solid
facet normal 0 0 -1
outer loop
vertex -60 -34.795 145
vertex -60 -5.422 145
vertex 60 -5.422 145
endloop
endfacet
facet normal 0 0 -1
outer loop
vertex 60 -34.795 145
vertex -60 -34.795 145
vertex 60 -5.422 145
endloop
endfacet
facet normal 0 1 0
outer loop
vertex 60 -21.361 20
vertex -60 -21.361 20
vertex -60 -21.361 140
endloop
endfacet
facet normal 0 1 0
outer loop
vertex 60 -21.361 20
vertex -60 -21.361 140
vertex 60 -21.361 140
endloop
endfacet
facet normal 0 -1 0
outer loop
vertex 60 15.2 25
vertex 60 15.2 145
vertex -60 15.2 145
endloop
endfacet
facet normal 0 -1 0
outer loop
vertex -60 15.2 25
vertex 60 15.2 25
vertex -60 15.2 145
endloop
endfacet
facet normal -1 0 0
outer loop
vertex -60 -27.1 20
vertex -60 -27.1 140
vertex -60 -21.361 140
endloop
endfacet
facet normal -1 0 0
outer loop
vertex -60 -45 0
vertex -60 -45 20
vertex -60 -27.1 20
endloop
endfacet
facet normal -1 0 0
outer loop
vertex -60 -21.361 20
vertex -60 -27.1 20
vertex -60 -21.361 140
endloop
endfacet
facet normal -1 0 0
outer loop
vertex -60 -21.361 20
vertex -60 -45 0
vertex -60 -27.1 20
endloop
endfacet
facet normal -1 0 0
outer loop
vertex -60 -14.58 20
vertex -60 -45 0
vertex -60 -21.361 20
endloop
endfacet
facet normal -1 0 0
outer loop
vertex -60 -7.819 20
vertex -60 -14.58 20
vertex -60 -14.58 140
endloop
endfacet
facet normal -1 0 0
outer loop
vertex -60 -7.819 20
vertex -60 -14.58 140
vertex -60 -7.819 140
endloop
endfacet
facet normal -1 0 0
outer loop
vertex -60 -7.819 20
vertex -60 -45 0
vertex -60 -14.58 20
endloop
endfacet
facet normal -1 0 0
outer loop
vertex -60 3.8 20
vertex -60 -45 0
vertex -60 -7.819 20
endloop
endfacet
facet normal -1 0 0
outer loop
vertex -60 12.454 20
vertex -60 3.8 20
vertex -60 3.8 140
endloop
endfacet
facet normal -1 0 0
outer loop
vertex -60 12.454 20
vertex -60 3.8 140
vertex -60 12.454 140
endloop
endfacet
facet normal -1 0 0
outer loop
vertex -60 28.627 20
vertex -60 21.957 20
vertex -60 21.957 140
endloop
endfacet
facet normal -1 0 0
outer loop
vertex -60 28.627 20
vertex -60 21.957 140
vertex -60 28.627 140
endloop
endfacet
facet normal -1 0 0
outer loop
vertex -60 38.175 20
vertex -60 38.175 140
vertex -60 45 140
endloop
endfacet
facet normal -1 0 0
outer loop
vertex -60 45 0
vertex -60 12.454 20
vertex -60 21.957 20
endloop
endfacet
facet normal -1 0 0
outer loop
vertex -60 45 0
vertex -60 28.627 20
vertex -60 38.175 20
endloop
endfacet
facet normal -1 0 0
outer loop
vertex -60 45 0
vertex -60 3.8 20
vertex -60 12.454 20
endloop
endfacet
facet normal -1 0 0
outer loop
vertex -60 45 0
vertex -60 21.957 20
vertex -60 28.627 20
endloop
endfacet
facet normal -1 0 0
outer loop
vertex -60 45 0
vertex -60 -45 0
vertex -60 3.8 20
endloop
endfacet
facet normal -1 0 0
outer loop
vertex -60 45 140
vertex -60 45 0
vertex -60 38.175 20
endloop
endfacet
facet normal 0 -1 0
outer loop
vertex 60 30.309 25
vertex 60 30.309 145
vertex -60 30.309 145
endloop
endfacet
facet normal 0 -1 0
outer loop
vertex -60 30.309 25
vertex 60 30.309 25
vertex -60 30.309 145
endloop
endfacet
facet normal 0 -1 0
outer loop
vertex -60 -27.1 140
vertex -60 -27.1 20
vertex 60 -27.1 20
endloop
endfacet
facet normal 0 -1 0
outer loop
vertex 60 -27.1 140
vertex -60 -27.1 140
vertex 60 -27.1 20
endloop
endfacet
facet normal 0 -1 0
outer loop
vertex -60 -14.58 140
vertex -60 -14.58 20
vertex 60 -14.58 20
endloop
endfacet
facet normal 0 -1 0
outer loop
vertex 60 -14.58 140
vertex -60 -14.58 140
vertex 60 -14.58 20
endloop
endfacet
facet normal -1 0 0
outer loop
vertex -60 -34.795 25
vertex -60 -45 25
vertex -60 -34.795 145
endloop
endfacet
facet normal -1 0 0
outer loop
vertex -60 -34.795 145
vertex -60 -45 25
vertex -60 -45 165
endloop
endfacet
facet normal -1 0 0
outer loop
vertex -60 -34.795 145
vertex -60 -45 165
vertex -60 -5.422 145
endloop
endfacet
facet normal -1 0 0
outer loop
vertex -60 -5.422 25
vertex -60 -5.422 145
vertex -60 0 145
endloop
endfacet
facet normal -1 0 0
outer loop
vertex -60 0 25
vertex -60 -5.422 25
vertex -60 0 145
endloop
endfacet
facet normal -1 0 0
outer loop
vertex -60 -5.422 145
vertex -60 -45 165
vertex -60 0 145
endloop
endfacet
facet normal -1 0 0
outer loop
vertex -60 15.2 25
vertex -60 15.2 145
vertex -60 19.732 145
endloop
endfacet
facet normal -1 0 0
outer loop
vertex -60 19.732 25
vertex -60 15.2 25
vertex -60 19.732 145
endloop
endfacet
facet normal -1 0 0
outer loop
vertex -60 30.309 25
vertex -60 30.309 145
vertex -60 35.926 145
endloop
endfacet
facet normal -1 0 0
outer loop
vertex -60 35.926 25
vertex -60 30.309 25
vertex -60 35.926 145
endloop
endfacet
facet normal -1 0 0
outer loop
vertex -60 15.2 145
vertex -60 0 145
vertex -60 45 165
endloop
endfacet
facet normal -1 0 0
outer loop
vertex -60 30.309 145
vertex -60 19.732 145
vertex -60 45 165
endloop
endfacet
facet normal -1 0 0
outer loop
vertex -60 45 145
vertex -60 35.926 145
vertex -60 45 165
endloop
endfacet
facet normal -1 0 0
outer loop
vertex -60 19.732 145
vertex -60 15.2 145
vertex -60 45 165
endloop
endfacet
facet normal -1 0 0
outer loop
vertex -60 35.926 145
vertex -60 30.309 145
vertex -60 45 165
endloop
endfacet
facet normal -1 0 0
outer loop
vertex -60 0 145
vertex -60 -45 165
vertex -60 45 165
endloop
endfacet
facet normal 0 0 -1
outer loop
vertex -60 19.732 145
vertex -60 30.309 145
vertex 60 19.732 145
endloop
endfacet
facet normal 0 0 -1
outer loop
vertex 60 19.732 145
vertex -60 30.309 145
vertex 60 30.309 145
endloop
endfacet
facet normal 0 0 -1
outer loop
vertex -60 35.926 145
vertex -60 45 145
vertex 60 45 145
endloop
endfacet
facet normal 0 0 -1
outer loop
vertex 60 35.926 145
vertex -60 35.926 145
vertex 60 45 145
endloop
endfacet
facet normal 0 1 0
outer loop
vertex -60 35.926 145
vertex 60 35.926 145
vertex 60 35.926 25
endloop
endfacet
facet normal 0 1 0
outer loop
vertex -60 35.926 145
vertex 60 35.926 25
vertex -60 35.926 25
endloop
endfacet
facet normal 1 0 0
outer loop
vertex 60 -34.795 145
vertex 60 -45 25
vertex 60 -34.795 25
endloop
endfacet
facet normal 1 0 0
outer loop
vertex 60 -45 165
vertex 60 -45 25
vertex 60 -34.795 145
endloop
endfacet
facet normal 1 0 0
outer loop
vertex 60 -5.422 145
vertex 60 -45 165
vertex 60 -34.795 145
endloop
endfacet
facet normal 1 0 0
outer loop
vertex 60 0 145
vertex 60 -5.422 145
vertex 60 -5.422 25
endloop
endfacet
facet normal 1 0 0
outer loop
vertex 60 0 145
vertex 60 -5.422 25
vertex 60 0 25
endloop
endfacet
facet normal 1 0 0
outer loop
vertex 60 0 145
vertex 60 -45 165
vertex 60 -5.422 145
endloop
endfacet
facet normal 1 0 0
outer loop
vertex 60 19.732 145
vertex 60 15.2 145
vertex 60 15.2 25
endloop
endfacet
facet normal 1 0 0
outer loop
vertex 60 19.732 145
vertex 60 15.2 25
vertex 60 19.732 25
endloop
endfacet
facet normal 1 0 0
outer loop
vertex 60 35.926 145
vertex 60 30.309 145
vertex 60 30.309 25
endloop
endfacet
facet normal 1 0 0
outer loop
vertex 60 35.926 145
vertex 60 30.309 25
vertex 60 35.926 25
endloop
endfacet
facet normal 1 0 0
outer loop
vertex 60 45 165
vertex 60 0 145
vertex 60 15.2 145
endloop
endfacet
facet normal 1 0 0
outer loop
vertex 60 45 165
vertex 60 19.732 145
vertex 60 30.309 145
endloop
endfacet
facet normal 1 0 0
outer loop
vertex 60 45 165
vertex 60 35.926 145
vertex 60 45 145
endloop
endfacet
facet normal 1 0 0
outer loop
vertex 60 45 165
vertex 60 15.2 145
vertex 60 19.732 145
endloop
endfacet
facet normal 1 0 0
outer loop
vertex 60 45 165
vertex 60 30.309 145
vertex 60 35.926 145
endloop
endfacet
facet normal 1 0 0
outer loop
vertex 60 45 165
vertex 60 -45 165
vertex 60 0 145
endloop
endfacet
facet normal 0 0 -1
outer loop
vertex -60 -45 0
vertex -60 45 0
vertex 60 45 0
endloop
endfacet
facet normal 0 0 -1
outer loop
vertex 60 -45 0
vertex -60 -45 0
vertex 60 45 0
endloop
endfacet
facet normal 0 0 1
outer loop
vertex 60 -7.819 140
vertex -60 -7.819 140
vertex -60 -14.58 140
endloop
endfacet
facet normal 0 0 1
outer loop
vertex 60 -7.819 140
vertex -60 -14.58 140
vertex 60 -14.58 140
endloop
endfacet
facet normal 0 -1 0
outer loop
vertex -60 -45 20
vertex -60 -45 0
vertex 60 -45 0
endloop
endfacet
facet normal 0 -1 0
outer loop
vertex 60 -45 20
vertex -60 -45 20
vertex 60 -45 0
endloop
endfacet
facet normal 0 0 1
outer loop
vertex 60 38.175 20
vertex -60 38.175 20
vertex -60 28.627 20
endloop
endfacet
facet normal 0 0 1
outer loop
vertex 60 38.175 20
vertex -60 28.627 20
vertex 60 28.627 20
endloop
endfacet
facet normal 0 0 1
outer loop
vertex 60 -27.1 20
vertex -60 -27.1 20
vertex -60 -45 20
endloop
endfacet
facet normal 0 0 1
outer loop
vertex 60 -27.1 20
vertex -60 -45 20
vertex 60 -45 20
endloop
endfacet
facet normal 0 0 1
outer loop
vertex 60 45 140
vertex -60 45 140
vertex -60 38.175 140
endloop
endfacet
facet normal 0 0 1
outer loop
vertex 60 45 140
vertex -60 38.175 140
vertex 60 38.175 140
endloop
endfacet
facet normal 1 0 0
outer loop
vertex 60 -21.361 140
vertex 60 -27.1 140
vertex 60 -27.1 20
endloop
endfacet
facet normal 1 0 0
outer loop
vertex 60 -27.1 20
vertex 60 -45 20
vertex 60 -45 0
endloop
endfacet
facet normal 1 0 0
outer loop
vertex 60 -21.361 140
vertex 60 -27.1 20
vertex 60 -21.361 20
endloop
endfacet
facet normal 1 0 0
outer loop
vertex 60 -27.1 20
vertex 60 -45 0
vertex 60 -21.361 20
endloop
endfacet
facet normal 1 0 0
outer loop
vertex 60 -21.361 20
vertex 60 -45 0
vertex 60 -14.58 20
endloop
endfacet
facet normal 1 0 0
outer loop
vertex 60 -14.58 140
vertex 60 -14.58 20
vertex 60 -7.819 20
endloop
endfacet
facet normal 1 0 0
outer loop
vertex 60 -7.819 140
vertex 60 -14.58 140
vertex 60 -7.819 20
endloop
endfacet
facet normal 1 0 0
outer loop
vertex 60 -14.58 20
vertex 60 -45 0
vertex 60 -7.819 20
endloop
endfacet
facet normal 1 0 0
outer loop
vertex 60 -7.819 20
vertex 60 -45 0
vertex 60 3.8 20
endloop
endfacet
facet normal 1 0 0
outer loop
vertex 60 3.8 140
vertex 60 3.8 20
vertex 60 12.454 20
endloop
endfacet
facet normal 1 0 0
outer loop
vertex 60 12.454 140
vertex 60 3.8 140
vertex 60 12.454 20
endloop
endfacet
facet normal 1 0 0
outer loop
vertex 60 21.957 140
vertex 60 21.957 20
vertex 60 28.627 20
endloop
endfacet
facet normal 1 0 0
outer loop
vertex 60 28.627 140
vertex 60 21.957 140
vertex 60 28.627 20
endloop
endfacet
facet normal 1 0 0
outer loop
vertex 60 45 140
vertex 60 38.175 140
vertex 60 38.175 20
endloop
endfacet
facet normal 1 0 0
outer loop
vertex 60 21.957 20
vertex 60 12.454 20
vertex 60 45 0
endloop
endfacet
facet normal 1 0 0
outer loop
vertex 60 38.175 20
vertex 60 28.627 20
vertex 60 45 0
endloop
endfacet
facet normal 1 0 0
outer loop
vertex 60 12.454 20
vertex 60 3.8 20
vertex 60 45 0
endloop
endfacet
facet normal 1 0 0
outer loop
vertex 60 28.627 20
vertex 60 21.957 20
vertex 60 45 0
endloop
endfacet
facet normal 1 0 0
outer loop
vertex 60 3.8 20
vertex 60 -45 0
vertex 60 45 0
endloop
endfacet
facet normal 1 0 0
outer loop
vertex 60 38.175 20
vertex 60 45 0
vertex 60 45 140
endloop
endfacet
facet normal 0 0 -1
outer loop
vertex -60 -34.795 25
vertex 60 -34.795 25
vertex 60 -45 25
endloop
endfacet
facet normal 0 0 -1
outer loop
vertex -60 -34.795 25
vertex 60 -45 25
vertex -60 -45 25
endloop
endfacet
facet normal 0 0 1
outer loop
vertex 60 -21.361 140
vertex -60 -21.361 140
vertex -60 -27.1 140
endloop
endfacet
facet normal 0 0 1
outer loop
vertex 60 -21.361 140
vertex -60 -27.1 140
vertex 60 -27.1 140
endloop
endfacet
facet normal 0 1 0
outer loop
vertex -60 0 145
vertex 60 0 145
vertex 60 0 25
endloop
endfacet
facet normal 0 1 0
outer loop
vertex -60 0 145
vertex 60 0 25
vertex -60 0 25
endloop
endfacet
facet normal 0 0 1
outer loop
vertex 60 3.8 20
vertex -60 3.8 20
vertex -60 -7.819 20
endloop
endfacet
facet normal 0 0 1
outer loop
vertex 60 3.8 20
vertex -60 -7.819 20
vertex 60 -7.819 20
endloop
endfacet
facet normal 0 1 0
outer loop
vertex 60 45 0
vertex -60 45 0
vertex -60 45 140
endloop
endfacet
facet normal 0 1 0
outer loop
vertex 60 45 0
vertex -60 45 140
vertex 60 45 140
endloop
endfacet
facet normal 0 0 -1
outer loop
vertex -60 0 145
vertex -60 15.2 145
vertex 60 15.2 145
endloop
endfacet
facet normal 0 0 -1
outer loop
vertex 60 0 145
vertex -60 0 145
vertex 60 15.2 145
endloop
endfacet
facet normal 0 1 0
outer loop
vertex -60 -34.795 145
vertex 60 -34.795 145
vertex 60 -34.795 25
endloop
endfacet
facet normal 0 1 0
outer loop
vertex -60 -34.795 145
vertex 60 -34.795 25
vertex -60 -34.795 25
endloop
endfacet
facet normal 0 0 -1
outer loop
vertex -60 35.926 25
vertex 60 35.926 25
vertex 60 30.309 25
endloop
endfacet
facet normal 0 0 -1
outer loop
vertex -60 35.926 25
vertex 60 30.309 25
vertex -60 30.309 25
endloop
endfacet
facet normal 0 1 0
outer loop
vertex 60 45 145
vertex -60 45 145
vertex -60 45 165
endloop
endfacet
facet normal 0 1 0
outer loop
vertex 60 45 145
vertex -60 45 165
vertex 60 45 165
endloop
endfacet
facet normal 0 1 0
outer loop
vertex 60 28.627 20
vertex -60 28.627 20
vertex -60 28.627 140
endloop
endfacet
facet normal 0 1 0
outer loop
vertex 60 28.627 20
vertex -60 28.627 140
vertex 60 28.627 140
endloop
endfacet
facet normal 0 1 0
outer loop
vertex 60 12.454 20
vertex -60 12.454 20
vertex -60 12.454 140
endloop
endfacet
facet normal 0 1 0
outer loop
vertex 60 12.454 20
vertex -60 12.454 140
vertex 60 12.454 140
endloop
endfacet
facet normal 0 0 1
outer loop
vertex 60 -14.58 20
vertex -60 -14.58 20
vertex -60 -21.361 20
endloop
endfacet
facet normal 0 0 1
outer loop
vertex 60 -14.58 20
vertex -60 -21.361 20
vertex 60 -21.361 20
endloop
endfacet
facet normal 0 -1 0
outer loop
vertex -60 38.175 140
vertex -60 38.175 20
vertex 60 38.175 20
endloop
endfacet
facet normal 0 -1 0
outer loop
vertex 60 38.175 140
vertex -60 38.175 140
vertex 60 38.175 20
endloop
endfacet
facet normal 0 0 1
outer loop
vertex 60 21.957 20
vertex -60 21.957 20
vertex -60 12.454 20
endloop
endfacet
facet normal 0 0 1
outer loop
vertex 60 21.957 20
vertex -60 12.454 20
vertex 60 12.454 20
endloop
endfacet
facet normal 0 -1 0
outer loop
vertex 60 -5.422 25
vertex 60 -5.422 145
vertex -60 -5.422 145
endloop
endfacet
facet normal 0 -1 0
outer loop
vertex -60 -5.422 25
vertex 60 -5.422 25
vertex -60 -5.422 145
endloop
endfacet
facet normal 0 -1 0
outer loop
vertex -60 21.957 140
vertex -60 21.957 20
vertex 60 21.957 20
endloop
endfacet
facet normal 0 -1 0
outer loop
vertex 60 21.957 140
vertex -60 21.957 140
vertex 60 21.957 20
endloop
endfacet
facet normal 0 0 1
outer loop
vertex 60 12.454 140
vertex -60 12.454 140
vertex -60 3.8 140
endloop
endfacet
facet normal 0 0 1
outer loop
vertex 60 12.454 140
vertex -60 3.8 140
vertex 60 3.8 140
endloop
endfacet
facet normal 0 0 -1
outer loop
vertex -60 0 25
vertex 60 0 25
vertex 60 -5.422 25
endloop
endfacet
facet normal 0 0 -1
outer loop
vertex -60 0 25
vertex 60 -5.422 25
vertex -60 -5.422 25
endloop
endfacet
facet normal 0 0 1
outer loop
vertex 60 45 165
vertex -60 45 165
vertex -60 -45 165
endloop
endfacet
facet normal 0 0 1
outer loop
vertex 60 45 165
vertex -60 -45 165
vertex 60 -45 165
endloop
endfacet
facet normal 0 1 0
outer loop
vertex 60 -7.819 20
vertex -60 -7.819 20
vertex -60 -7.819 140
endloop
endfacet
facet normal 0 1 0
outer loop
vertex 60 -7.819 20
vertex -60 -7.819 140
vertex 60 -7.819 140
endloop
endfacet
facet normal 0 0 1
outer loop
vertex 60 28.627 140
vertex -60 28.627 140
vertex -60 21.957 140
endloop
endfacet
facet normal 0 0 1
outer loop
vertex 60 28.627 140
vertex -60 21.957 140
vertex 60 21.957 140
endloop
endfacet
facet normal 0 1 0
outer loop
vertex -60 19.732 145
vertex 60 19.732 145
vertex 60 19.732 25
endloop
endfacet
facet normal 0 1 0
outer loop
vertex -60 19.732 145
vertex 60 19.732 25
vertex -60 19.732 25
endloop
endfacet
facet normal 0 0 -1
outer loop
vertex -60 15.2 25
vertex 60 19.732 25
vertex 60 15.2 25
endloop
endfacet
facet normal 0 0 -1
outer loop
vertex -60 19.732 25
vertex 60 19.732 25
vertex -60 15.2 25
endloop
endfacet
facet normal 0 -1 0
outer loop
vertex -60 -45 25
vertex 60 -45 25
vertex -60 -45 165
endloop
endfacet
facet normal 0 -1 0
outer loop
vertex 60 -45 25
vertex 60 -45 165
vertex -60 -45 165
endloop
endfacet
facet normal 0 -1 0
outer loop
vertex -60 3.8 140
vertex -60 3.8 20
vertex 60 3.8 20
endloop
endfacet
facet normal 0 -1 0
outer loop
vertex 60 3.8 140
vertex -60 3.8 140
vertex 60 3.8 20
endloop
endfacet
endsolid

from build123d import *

# Parameters (mm, degrees)
SKETCH1_W           = 120
SKETCH1_H           = 90
BOSS_EXTRUDE1_DEPTH = 20
SKETCH2_W           = 120
SKETCH2_H           = 6.825131856
SKETCH2_H_2         = 6.669593715
SKETCH2_H_3         = 8.654042108
SKETCH2_H_4         = 6.760829407
BOSS_EXTRUDE2_DEPTH = 120
BOSS_EXTRUDE3_START = 5
SKETCH3_W           = 120
SKETCH3_H           = 90
BOSS_EXTRUDE3_DEPTH = 20
SKETCH4_W           = 120
SKETCH4_H           = 10.204938942
SKETCH4_H_2         = 5.422041007
SKETCH4_H_3         = 4.532546326
SKETCH4_H_4         = 5.616460423
BOSS_EXTRUDE4_DEPTH = 120
SKETCH6_W           = 120
SKETCH6_H           = 5.739167773
BOSS_EXTRUDE5_DEPTH = 120


with BuildPart() as part:
    # Sketch1 → Boss-Extrude1 (new body)
    with BuildSketch(Plane.XY):
        Rectangle(SKETCH1_W, SKETCH1_H)
    extrude(amount=BOSS_EXTRUDE1_DEPTH)

    # Sketch2 → Boss-Extrude2 (add)
    with BuildSketch(Plane.XY.offset(20)):
        with Locations((0, 41.587434072)):
            Rectangle(SKETCH2_W, SKETCH2_H)
        with Locations((0, 25.292270515)):
            Rectangle(SKETCH2_W, SKETCH2_H_2)
        with Locations((0, 8.127218066)):
            Rectangle(SKETCH2_W, SKETCH2_H_3)
        with Locations((0, -11.199496108)):
            Rectangle(SKETCH2_W, SKETCH2_H_4)
    extrude(amount=BOSS_EXTRUDE2_DEPTH)

    # Sketch6 → Boss-Extrude5 (add)
    with BuildSketch(Plane.XY.offset(20)):
        with Locations((0, -24.230856336)):
            Rectangle(SKETCH6_W, SKETCH6_H)
    extrude(amount=BOSS_EXTRUDE5_DEPTH)


with BuildPart() as body_2:
    # Sketch3 → Boss-Extrude3 (new body)
    with BuildSketch(Plane.XY.offset(140).offset(BOSS_EXTRUDE3_START)):
        Rectangle(SKETCH3_W, SKETCH3_H)
    extrude(amount=BOSS_EXTRUDE3_DEPTH)

    # Sketch4 → Boss-Extrude4 (add)
    with BuildSketch(Plane(origin=(0, 0, 145), x_dir=(-1, 0, 0), z_dir=(0, 0, -1))):
        with Locations((0, -39.897530529)):
            Rectangle(SKETCH4_W, SKETCH4_H)
        with Locations((0, -2.711020504)):
            Rectangle(SKETCH4_W, SKETCH4_H_2)
        with Locations((0, 17.465860455)):
            Rectangle(SKETCH4_W, SKETCH4_H_3)
        with Locations((0, 33.117464461)):
            Rectangle(SKETCH4_W, SKETCH4_H_4)
    extrude(amount=BOSS_EXTRUDE4_DEPTH)


solid = Compound([part.part, body_2.part])
